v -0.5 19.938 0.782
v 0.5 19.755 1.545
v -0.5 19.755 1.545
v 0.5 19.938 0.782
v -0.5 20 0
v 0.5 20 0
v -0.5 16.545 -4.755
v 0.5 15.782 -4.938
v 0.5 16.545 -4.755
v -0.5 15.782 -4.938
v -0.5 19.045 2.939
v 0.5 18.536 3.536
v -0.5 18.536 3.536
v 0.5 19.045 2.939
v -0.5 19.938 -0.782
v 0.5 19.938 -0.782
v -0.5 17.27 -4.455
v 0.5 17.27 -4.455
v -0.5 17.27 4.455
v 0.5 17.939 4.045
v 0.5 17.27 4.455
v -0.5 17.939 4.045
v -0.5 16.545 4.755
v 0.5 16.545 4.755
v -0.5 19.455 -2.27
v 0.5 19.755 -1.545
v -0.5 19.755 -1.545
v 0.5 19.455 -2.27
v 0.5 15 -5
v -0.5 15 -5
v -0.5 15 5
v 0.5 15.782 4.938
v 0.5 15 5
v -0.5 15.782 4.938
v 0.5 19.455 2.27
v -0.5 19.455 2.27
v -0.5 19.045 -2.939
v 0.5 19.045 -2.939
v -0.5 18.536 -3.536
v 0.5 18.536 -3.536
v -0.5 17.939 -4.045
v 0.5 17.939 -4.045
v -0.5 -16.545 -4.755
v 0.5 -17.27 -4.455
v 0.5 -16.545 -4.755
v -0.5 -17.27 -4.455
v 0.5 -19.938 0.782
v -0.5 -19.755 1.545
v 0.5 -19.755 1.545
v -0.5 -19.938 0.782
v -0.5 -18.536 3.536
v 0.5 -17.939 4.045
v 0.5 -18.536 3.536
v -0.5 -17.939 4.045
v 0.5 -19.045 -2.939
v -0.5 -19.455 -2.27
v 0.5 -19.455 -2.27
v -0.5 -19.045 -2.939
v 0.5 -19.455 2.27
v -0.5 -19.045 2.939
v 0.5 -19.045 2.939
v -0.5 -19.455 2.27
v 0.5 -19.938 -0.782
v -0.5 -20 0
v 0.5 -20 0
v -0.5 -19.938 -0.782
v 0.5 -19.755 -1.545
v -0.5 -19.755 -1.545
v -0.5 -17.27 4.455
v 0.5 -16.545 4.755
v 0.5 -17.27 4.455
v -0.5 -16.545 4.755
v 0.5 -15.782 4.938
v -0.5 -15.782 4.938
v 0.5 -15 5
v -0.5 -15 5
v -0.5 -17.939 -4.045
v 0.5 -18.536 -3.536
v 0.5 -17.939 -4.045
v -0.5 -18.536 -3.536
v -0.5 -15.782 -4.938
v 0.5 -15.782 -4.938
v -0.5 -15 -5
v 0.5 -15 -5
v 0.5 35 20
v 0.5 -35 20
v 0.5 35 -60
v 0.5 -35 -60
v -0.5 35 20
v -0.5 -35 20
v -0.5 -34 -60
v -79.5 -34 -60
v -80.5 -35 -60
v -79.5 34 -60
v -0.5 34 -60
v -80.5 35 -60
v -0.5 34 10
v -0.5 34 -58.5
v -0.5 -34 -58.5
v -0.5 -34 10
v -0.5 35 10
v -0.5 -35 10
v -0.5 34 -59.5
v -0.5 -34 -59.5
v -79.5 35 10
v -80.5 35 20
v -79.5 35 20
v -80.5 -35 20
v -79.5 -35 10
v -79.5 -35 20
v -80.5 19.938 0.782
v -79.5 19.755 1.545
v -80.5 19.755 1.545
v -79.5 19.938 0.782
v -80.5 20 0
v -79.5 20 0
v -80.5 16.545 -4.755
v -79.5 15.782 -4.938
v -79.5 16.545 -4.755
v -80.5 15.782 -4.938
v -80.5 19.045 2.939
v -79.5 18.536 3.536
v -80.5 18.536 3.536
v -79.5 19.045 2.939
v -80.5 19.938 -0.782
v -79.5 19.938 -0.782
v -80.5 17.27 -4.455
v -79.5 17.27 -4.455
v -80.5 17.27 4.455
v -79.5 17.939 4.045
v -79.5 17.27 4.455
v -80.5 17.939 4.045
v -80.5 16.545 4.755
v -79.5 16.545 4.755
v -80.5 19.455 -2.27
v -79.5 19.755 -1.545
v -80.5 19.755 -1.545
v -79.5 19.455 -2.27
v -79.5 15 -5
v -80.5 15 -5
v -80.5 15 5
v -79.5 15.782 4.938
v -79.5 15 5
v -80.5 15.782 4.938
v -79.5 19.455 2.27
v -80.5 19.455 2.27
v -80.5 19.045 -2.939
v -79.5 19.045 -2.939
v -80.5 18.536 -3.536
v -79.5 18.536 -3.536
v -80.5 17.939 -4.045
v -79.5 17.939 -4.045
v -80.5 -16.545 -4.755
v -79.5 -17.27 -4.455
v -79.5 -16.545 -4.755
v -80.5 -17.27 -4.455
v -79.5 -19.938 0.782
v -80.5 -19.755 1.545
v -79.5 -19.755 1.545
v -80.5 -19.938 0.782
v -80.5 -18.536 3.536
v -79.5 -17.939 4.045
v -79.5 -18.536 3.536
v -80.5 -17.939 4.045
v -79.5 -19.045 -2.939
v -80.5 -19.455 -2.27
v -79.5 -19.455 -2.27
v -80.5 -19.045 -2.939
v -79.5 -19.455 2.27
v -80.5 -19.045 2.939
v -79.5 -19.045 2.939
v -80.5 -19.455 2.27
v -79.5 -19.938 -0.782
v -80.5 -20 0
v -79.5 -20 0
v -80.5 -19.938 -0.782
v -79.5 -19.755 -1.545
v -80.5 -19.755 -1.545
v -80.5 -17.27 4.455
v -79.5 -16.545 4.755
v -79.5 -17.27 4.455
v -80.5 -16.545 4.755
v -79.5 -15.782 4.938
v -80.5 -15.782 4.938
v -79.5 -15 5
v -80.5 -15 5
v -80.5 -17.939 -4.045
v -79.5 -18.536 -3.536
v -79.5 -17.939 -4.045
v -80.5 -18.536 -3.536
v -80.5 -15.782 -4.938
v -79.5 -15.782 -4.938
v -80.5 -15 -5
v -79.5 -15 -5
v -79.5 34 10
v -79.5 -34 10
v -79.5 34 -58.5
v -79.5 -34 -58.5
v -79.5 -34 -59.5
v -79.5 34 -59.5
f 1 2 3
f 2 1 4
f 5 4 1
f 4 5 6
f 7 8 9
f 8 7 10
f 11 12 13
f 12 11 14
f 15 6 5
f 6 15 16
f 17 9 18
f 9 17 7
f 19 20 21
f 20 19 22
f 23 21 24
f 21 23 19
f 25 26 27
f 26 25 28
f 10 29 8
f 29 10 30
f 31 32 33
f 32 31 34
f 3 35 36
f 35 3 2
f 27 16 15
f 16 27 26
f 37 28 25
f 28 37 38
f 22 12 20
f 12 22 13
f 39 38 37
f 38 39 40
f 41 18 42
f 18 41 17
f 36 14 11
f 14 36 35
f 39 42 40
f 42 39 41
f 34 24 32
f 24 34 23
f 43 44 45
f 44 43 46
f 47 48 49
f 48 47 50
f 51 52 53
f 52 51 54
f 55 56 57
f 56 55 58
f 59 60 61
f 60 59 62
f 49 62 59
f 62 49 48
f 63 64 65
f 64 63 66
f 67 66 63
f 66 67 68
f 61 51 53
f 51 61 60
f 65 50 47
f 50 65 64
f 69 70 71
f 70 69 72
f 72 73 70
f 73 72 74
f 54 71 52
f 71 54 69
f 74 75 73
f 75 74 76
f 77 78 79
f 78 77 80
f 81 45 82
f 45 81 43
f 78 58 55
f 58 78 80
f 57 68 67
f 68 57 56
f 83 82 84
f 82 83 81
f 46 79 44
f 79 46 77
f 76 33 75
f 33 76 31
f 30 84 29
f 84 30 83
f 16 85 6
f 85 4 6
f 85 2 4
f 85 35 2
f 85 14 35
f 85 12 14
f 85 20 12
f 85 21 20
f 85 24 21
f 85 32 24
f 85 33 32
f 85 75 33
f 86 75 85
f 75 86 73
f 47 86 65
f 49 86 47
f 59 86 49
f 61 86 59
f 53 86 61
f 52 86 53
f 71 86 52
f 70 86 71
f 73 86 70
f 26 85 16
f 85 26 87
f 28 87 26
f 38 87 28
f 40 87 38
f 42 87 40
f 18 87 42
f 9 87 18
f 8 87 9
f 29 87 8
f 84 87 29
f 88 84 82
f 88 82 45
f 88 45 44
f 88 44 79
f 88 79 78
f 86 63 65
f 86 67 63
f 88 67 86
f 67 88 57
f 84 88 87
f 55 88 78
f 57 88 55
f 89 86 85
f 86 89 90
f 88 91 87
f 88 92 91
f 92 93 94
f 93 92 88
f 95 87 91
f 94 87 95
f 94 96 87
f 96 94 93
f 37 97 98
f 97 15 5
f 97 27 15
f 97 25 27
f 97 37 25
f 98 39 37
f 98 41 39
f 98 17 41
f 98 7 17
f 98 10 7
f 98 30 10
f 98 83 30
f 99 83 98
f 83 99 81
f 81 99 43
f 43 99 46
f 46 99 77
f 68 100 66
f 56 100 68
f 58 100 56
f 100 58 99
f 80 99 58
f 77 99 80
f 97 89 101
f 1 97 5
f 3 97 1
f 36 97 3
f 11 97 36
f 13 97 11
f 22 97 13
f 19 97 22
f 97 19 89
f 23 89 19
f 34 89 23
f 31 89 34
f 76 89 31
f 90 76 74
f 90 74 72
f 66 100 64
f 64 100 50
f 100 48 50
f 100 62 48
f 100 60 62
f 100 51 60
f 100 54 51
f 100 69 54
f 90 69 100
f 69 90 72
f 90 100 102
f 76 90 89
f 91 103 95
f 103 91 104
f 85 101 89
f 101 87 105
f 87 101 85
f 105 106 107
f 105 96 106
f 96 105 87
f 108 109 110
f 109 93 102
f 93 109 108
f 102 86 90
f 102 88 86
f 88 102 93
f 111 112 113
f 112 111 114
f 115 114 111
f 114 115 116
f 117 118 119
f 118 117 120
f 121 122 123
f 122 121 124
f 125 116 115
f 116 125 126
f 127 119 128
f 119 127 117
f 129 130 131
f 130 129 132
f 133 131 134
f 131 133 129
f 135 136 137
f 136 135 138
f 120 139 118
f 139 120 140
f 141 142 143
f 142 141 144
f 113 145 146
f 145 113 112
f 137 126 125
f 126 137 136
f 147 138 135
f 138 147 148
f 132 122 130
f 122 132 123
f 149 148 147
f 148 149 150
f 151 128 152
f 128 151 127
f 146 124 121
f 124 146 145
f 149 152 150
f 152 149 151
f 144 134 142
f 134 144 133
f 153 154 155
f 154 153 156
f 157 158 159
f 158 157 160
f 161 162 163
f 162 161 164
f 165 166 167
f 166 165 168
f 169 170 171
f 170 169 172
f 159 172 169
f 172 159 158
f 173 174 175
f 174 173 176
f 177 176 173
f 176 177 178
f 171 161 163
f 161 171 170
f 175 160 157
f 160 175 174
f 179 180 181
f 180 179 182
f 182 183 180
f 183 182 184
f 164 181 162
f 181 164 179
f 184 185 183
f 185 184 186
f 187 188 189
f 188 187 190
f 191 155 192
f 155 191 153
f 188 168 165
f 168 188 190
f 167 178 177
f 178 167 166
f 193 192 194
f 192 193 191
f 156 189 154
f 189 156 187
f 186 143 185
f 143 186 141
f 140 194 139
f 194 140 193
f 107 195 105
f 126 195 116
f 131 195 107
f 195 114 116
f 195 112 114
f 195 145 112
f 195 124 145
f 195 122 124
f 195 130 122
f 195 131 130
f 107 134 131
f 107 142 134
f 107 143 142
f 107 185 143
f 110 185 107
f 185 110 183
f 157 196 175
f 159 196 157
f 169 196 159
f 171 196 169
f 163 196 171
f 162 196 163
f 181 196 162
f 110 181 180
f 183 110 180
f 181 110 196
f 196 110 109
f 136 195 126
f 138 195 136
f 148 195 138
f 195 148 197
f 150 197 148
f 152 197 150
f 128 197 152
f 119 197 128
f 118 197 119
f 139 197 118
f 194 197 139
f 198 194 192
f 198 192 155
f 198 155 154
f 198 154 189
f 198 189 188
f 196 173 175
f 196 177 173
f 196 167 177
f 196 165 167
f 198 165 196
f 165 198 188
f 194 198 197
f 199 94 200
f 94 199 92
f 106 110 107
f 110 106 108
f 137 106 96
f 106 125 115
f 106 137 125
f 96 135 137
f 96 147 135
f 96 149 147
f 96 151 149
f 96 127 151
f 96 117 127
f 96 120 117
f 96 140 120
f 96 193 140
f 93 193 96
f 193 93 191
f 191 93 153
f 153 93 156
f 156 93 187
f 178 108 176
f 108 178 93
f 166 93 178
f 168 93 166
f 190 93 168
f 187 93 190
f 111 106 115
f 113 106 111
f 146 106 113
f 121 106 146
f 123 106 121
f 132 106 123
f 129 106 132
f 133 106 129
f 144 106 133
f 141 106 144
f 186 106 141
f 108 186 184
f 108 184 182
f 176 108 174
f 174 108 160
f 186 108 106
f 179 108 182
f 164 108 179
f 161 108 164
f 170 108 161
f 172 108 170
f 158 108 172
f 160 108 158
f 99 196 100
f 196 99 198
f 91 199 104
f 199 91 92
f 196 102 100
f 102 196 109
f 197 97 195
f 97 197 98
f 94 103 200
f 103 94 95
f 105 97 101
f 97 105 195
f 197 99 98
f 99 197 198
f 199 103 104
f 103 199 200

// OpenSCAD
module slot(){

    Key_Lenght = 100;
    Key_Height = 100;
    Key_Width = 150;
    
    color("#a8b0b2")
    union(){
        translate([15,0,0])
        cylinder(5,5,5, $fn=40, center=true);

        translate([-15,0,0])
        cylinder(5,5,5, $fn=40, center=true);

        cube([30,10,5],center = true);
    }
}

color("#ccaa66"){
   
difference(){
    translate([0,0,-20]){
    cube([1,70,80], center = true);
    }
        translate([0,0,0]){
            rotate([90,0,90]){
                slot();
            }
        }
}

translate([-80,0,0])
difference(){
    translate([0,0,-20]){
    cube([1,70,80], center = true);
    }
        translate([0,0,0]){
            rotate([90,0,90]){
                slot();
            }
        }        
}


rotate([90,0,90])
translate([-34.5,-25,-40])
cube([1,70,79], center = true);

rotate([90,0,90])
translate([34.5,-25,-40])
cube([1,70,79], center = true);

translate([-40,0,-59])
cube([80,68,1], center = true);
}
